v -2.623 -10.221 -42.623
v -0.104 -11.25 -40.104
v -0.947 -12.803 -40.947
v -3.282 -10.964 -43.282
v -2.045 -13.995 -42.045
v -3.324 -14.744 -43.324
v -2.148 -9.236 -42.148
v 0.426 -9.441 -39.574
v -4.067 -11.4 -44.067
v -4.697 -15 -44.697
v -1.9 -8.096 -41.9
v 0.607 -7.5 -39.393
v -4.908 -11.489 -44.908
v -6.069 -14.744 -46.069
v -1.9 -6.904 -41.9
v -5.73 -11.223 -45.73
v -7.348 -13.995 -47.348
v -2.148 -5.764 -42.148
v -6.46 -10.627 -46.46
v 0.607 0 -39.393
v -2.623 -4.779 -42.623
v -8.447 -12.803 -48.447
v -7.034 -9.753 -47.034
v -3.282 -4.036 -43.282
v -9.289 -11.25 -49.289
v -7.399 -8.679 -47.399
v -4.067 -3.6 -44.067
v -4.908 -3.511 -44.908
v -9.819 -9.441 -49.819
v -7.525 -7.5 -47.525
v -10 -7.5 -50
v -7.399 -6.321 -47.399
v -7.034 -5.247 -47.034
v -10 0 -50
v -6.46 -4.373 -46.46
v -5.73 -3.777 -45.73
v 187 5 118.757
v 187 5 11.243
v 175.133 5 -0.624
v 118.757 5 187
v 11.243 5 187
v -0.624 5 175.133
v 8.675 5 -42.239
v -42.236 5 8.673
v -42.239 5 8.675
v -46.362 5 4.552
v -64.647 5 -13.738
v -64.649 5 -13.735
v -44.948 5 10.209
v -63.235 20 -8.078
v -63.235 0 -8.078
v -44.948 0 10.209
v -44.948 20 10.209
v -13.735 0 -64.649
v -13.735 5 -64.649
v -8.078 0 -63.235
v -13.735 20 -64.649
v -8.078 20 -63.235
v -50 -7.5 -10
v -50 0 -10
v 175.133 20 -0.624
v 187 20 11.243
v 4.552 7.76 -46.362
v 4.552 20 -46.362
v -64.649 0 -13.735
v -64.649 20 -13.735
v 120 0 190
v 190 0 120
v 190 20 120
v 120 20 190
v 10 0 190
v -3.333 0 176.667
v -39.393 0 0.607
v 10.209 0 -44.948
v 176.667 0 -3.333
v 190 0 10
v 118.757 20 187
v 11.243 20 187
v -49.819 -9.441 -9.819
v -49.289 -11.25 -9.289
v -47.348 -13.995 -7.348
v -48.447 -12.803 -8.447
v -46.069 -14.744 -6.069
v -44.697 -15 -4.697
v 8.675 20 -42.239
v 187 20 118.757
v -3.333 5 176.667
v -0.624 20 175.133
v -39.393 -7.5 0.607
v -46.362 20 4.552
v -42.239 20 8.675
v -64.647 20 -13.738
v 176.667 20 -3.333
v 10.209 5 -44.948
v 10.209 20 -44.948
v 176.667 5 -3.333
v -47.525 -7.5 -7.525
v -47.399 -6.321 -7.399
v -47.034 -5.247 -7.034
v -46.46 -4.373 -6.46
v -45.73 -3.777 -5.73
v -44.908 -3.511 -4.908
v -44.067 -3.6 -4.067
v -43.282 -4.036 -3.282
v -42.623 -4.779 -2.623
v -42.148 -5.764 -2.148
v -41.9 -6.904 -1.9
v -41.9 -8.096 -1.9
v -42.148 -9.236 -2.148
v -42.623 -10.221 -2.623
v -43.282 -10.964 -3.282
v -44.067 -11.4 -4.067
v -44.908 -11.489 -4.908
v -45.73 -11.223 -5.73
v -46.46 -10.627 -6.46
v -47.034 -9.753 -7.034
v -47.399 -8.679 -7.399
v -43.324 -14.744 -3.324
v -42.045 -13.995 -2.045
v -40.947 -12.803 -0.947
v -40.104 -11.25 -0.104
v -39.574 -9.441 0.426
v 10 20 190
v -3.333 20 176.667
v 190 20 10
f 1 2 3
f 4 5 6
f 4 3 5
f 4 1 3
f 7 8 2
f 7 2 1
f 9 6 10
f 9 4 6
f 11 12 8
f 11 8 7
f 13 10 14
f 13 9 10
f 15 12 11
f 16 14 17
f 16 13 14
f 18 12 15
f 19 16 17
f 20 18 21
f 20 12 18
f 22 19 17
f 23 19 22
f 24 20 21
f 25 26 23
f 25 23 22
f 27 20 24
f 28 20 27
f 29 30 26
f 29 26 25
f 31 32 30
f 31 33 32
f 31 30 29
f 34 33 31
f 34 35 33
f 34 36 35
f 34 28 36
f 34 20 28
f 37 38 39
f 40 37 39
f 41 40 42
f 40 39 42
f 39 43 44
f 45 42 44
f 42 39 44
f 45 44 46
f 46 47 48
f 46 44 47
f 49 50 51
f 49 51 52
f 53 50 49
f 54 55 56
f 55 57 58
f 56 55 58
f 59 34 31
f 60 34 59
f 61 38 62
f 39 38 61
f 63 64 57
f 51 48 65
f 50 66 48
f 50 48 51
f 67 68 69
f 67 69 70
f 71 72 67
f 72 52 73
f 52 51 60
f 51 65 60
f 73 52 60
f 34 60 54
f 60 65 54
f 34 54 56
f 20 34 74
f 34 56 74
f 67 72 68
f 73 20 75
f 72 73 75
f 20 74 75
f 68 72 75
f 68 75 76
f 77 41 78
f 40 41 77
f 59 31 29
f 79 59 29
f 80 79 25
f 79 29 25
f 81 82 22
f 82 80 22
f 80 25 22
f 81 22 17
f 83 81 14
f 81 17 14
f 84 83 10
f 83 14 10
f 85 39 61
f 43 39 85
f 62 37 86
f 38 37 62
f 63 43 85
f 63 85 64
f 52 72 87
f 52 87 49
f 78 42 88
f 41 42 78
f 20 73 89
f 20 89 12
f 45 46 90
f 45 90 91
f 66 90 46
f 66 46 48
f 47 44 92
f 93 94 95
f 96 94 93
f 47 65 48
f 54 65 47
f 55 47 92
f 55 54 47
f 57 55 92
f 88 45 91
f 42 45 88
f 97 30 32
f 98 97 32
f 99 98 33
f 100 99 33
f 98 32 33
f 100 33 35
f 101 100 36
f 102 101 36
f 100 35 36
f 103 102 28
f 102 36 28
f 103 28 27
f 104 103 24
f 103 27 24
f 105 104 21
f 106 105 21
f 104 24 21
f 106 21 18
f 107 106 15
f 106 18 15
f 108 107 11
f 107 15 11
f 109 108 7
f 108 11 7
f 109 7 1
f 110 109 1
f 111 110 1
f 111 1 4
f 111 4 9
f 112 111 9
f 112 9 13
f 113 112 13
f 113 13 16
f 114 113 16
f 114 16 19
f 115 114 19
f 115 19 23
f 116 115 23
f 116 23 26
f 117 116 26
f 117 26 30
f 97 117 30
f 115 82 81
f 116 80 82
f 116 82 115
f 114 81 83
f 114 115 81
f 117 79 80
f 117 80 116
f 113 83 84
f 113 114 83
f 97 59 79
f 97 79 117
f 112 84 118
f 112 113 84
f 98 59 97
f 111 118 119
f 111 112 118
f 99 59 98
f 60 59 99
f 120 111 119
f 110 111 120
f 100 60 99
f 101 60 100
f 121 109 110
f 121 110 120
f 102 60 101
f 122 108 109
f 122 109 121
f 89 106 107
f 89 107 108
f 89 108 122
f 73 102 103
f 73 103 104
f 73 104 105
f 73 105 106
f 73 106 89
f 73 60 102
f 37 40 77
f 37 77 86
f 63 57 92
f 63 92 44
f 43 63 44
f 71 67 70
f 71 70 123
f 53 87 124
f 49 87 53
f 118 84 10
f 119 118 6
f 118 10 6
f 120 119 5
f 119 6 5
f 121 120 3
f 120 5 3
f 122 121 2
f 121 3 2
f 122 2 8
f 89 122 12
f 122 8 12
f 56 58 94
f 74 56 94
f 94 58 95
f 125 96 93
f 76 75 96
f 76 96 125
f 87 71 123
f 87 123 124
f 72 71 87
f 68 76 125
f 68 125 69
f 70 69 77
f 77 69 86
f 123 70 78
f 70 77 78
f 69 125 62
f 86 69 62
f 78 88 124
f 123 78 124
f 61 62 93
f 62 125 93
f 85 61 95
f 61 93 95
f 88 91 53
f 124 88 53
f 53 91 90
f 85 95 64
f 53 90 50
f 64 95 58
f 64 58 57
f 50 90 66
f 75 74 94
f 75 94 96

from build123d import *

# Parameters (mm, degrees)
EXTRUDE_1_DEPTH     = 5
EXTRUDE_2_DEPTH     = 15
CUT_EXTRUDE_1_DEPTH = 60
SKETCH_4_R          = 4
CUT_EXTRUDE_2_DEPTH = 60
EXTRUDE_3_DEPTH     = 15
SKETCH_6_W          = 72.003415158
SKETCH_6_H          = 5
EXTRUDE_4_DEPTH     = 13
EXTRUDE_5_DEPTH     = 20
EXTRUDE_6_DEPTH     = 72


with BuildPart() as part:
    # 草图1 → 凸台-拉伸1 (new body)
    with BuildSketch(Plane(origin=(0, 0, 0), x_dir=(1, 0, 0), z_dir=(0, 1, 0))):
        Polygon((-50, 10), (-10, 50), (176.666666667, 3.333333333), (190, -10), (190, -120), (120, -190), (10, -190), (-3.333333333, -176.666666667), align=None)
    extrude(amount=EXTRUDE_1_DEPTH)

    # 草图2 → 凸台-拉伸2 (add)
    with BuildSketch(Plane.XZ):
        Polygon((-50, -10), (-39.393398282, 0.606601718), (0.606601718, -39.393398282), (-10, -50), align=None)
    extrude(amount=EXTRUDE_2_DEPTH)

    # 草图3 → 切除-拉伸1 (cut)
    with BuildSketch(Plane(origin=(20, 0, -20), x_dir=(-0.7071067811865475, 0, -0.7071067811865476), z_dir=(0.7071067811865476, 0, -0.7071067811865475))):
        with BuildLine():
            Line((27.426406871, -7.5), (27.426406871, -15))
            Line((27.426406871, -15), (34.926406871, -15))
            ThreePointArc((34.926406871, -15), (29.623106012, -12.803300859), (27.426406871, -7.5))
        make_face()
    extrude(amount=-CUT_EXTRUDE_1_DEPTH, mode=Mode.SUBTRACT)

    # 草图4 → 切除-拉伸2 (cut)
    with BuildSketch(Plane(origin=(20, 0, -20), x_dir=(-0.7071067811865474, 0, -0.7071067811865477), z_dir=(0.7071067811865477, 0, -0.7071067811865474))):
        with Locations((34.926406871, -7.5)):
            Circle(SKETCH_4_R)
        with BuildLine():
            Line((34.926406871, -15), (42.426406871, -15))
            Line((42.426406871, -15), (42.426406871, -7.5))
            ThreePointArc((42.426406871, -7.5), (40.22970773, -12.803300859), (34.926406871, -15))
        make_face()
    extrude(amount=-CUT_EXTRUDE_2_DEPTH, mode=Mode.SUBTRACT)

    # 草图5 → 凸台-拉伸3 (add)
    with BuildSketch(Plane(origin=(0, 5, 0), x_dir=(1, 0, 0), z_dir=(0, 1, 0))):
        Polygon((-0.62444127, -175.132918043), (11.242640687, -187), (118.757359313, -187), (187, -118.757359313), (187, -11.242640687), (175.132918043, 0.62444127), (8.675243128, 42.238859999), (4.552137502, 46.361965624), (176.666666667, 3.333333333), (190, -10), (190, -120), (120, -190), (10, -190), (-3.333333333, -176.666666667), (-46.361965624, -4.552137502), (-42.238859999, -8.675243128), align=None)
    extrude(amount=EXTRUDE_3_DEPTH)

    # 草图6 → 凸台-拉伸4 (add, symmetric)
    with BuildSketch(Plane(origin=(-30, 0, -30), x_dir=(-0.7071067811865475, 0, 0.7071067811865476), z_dir=(-0.7071067811865476, 0, -0.7071067811865475))):
        with Locations((0, 2.5)):
            Rectangle(SKETCH_6_W, SKETCH_6_H)
    extrude(amount=EXTRUDE_4_DEPTH, both=True)

    # 草图7 → 凸台-拉伸5 (add)
    with BuildSketch(Plane(origin=(0, 20, 0), x_dir=(1, 0, 0), z_dir=(0, 1, 0))):
        Polygon((-42.238859999, -8.675243128), (-64.649439719, 13.735336592), (-63.235226156, 8.078482343), (-44.947752062, -10.208991752), align=None)
        Polygon((8.675243128, 42.238859999), (-13.735336592, 64.649439719), (-8.078482343, 63.235226156), (10.208991752, 44.947752062), align=None)
    extrude(amount=-EXTRUDE_5_DEPTH)

    # 草图8 → 凸台-拉伸6 (add)
    with BuildSketch(Plane(origin=(25.457051563, 0, -25.457051563), x_dir=(0.7071067811865439, 0, 0.7071067811865511), z_dir=(-0.7071067811865511, 0, 0.7071067811865439))):
        Polygon((-55.426406871, 20), (-23.733061091, 5), (-55.426406871, 5), align=None)
    extrude(amount=EXTRUDE_6_DEPTH)


solid = part.part
